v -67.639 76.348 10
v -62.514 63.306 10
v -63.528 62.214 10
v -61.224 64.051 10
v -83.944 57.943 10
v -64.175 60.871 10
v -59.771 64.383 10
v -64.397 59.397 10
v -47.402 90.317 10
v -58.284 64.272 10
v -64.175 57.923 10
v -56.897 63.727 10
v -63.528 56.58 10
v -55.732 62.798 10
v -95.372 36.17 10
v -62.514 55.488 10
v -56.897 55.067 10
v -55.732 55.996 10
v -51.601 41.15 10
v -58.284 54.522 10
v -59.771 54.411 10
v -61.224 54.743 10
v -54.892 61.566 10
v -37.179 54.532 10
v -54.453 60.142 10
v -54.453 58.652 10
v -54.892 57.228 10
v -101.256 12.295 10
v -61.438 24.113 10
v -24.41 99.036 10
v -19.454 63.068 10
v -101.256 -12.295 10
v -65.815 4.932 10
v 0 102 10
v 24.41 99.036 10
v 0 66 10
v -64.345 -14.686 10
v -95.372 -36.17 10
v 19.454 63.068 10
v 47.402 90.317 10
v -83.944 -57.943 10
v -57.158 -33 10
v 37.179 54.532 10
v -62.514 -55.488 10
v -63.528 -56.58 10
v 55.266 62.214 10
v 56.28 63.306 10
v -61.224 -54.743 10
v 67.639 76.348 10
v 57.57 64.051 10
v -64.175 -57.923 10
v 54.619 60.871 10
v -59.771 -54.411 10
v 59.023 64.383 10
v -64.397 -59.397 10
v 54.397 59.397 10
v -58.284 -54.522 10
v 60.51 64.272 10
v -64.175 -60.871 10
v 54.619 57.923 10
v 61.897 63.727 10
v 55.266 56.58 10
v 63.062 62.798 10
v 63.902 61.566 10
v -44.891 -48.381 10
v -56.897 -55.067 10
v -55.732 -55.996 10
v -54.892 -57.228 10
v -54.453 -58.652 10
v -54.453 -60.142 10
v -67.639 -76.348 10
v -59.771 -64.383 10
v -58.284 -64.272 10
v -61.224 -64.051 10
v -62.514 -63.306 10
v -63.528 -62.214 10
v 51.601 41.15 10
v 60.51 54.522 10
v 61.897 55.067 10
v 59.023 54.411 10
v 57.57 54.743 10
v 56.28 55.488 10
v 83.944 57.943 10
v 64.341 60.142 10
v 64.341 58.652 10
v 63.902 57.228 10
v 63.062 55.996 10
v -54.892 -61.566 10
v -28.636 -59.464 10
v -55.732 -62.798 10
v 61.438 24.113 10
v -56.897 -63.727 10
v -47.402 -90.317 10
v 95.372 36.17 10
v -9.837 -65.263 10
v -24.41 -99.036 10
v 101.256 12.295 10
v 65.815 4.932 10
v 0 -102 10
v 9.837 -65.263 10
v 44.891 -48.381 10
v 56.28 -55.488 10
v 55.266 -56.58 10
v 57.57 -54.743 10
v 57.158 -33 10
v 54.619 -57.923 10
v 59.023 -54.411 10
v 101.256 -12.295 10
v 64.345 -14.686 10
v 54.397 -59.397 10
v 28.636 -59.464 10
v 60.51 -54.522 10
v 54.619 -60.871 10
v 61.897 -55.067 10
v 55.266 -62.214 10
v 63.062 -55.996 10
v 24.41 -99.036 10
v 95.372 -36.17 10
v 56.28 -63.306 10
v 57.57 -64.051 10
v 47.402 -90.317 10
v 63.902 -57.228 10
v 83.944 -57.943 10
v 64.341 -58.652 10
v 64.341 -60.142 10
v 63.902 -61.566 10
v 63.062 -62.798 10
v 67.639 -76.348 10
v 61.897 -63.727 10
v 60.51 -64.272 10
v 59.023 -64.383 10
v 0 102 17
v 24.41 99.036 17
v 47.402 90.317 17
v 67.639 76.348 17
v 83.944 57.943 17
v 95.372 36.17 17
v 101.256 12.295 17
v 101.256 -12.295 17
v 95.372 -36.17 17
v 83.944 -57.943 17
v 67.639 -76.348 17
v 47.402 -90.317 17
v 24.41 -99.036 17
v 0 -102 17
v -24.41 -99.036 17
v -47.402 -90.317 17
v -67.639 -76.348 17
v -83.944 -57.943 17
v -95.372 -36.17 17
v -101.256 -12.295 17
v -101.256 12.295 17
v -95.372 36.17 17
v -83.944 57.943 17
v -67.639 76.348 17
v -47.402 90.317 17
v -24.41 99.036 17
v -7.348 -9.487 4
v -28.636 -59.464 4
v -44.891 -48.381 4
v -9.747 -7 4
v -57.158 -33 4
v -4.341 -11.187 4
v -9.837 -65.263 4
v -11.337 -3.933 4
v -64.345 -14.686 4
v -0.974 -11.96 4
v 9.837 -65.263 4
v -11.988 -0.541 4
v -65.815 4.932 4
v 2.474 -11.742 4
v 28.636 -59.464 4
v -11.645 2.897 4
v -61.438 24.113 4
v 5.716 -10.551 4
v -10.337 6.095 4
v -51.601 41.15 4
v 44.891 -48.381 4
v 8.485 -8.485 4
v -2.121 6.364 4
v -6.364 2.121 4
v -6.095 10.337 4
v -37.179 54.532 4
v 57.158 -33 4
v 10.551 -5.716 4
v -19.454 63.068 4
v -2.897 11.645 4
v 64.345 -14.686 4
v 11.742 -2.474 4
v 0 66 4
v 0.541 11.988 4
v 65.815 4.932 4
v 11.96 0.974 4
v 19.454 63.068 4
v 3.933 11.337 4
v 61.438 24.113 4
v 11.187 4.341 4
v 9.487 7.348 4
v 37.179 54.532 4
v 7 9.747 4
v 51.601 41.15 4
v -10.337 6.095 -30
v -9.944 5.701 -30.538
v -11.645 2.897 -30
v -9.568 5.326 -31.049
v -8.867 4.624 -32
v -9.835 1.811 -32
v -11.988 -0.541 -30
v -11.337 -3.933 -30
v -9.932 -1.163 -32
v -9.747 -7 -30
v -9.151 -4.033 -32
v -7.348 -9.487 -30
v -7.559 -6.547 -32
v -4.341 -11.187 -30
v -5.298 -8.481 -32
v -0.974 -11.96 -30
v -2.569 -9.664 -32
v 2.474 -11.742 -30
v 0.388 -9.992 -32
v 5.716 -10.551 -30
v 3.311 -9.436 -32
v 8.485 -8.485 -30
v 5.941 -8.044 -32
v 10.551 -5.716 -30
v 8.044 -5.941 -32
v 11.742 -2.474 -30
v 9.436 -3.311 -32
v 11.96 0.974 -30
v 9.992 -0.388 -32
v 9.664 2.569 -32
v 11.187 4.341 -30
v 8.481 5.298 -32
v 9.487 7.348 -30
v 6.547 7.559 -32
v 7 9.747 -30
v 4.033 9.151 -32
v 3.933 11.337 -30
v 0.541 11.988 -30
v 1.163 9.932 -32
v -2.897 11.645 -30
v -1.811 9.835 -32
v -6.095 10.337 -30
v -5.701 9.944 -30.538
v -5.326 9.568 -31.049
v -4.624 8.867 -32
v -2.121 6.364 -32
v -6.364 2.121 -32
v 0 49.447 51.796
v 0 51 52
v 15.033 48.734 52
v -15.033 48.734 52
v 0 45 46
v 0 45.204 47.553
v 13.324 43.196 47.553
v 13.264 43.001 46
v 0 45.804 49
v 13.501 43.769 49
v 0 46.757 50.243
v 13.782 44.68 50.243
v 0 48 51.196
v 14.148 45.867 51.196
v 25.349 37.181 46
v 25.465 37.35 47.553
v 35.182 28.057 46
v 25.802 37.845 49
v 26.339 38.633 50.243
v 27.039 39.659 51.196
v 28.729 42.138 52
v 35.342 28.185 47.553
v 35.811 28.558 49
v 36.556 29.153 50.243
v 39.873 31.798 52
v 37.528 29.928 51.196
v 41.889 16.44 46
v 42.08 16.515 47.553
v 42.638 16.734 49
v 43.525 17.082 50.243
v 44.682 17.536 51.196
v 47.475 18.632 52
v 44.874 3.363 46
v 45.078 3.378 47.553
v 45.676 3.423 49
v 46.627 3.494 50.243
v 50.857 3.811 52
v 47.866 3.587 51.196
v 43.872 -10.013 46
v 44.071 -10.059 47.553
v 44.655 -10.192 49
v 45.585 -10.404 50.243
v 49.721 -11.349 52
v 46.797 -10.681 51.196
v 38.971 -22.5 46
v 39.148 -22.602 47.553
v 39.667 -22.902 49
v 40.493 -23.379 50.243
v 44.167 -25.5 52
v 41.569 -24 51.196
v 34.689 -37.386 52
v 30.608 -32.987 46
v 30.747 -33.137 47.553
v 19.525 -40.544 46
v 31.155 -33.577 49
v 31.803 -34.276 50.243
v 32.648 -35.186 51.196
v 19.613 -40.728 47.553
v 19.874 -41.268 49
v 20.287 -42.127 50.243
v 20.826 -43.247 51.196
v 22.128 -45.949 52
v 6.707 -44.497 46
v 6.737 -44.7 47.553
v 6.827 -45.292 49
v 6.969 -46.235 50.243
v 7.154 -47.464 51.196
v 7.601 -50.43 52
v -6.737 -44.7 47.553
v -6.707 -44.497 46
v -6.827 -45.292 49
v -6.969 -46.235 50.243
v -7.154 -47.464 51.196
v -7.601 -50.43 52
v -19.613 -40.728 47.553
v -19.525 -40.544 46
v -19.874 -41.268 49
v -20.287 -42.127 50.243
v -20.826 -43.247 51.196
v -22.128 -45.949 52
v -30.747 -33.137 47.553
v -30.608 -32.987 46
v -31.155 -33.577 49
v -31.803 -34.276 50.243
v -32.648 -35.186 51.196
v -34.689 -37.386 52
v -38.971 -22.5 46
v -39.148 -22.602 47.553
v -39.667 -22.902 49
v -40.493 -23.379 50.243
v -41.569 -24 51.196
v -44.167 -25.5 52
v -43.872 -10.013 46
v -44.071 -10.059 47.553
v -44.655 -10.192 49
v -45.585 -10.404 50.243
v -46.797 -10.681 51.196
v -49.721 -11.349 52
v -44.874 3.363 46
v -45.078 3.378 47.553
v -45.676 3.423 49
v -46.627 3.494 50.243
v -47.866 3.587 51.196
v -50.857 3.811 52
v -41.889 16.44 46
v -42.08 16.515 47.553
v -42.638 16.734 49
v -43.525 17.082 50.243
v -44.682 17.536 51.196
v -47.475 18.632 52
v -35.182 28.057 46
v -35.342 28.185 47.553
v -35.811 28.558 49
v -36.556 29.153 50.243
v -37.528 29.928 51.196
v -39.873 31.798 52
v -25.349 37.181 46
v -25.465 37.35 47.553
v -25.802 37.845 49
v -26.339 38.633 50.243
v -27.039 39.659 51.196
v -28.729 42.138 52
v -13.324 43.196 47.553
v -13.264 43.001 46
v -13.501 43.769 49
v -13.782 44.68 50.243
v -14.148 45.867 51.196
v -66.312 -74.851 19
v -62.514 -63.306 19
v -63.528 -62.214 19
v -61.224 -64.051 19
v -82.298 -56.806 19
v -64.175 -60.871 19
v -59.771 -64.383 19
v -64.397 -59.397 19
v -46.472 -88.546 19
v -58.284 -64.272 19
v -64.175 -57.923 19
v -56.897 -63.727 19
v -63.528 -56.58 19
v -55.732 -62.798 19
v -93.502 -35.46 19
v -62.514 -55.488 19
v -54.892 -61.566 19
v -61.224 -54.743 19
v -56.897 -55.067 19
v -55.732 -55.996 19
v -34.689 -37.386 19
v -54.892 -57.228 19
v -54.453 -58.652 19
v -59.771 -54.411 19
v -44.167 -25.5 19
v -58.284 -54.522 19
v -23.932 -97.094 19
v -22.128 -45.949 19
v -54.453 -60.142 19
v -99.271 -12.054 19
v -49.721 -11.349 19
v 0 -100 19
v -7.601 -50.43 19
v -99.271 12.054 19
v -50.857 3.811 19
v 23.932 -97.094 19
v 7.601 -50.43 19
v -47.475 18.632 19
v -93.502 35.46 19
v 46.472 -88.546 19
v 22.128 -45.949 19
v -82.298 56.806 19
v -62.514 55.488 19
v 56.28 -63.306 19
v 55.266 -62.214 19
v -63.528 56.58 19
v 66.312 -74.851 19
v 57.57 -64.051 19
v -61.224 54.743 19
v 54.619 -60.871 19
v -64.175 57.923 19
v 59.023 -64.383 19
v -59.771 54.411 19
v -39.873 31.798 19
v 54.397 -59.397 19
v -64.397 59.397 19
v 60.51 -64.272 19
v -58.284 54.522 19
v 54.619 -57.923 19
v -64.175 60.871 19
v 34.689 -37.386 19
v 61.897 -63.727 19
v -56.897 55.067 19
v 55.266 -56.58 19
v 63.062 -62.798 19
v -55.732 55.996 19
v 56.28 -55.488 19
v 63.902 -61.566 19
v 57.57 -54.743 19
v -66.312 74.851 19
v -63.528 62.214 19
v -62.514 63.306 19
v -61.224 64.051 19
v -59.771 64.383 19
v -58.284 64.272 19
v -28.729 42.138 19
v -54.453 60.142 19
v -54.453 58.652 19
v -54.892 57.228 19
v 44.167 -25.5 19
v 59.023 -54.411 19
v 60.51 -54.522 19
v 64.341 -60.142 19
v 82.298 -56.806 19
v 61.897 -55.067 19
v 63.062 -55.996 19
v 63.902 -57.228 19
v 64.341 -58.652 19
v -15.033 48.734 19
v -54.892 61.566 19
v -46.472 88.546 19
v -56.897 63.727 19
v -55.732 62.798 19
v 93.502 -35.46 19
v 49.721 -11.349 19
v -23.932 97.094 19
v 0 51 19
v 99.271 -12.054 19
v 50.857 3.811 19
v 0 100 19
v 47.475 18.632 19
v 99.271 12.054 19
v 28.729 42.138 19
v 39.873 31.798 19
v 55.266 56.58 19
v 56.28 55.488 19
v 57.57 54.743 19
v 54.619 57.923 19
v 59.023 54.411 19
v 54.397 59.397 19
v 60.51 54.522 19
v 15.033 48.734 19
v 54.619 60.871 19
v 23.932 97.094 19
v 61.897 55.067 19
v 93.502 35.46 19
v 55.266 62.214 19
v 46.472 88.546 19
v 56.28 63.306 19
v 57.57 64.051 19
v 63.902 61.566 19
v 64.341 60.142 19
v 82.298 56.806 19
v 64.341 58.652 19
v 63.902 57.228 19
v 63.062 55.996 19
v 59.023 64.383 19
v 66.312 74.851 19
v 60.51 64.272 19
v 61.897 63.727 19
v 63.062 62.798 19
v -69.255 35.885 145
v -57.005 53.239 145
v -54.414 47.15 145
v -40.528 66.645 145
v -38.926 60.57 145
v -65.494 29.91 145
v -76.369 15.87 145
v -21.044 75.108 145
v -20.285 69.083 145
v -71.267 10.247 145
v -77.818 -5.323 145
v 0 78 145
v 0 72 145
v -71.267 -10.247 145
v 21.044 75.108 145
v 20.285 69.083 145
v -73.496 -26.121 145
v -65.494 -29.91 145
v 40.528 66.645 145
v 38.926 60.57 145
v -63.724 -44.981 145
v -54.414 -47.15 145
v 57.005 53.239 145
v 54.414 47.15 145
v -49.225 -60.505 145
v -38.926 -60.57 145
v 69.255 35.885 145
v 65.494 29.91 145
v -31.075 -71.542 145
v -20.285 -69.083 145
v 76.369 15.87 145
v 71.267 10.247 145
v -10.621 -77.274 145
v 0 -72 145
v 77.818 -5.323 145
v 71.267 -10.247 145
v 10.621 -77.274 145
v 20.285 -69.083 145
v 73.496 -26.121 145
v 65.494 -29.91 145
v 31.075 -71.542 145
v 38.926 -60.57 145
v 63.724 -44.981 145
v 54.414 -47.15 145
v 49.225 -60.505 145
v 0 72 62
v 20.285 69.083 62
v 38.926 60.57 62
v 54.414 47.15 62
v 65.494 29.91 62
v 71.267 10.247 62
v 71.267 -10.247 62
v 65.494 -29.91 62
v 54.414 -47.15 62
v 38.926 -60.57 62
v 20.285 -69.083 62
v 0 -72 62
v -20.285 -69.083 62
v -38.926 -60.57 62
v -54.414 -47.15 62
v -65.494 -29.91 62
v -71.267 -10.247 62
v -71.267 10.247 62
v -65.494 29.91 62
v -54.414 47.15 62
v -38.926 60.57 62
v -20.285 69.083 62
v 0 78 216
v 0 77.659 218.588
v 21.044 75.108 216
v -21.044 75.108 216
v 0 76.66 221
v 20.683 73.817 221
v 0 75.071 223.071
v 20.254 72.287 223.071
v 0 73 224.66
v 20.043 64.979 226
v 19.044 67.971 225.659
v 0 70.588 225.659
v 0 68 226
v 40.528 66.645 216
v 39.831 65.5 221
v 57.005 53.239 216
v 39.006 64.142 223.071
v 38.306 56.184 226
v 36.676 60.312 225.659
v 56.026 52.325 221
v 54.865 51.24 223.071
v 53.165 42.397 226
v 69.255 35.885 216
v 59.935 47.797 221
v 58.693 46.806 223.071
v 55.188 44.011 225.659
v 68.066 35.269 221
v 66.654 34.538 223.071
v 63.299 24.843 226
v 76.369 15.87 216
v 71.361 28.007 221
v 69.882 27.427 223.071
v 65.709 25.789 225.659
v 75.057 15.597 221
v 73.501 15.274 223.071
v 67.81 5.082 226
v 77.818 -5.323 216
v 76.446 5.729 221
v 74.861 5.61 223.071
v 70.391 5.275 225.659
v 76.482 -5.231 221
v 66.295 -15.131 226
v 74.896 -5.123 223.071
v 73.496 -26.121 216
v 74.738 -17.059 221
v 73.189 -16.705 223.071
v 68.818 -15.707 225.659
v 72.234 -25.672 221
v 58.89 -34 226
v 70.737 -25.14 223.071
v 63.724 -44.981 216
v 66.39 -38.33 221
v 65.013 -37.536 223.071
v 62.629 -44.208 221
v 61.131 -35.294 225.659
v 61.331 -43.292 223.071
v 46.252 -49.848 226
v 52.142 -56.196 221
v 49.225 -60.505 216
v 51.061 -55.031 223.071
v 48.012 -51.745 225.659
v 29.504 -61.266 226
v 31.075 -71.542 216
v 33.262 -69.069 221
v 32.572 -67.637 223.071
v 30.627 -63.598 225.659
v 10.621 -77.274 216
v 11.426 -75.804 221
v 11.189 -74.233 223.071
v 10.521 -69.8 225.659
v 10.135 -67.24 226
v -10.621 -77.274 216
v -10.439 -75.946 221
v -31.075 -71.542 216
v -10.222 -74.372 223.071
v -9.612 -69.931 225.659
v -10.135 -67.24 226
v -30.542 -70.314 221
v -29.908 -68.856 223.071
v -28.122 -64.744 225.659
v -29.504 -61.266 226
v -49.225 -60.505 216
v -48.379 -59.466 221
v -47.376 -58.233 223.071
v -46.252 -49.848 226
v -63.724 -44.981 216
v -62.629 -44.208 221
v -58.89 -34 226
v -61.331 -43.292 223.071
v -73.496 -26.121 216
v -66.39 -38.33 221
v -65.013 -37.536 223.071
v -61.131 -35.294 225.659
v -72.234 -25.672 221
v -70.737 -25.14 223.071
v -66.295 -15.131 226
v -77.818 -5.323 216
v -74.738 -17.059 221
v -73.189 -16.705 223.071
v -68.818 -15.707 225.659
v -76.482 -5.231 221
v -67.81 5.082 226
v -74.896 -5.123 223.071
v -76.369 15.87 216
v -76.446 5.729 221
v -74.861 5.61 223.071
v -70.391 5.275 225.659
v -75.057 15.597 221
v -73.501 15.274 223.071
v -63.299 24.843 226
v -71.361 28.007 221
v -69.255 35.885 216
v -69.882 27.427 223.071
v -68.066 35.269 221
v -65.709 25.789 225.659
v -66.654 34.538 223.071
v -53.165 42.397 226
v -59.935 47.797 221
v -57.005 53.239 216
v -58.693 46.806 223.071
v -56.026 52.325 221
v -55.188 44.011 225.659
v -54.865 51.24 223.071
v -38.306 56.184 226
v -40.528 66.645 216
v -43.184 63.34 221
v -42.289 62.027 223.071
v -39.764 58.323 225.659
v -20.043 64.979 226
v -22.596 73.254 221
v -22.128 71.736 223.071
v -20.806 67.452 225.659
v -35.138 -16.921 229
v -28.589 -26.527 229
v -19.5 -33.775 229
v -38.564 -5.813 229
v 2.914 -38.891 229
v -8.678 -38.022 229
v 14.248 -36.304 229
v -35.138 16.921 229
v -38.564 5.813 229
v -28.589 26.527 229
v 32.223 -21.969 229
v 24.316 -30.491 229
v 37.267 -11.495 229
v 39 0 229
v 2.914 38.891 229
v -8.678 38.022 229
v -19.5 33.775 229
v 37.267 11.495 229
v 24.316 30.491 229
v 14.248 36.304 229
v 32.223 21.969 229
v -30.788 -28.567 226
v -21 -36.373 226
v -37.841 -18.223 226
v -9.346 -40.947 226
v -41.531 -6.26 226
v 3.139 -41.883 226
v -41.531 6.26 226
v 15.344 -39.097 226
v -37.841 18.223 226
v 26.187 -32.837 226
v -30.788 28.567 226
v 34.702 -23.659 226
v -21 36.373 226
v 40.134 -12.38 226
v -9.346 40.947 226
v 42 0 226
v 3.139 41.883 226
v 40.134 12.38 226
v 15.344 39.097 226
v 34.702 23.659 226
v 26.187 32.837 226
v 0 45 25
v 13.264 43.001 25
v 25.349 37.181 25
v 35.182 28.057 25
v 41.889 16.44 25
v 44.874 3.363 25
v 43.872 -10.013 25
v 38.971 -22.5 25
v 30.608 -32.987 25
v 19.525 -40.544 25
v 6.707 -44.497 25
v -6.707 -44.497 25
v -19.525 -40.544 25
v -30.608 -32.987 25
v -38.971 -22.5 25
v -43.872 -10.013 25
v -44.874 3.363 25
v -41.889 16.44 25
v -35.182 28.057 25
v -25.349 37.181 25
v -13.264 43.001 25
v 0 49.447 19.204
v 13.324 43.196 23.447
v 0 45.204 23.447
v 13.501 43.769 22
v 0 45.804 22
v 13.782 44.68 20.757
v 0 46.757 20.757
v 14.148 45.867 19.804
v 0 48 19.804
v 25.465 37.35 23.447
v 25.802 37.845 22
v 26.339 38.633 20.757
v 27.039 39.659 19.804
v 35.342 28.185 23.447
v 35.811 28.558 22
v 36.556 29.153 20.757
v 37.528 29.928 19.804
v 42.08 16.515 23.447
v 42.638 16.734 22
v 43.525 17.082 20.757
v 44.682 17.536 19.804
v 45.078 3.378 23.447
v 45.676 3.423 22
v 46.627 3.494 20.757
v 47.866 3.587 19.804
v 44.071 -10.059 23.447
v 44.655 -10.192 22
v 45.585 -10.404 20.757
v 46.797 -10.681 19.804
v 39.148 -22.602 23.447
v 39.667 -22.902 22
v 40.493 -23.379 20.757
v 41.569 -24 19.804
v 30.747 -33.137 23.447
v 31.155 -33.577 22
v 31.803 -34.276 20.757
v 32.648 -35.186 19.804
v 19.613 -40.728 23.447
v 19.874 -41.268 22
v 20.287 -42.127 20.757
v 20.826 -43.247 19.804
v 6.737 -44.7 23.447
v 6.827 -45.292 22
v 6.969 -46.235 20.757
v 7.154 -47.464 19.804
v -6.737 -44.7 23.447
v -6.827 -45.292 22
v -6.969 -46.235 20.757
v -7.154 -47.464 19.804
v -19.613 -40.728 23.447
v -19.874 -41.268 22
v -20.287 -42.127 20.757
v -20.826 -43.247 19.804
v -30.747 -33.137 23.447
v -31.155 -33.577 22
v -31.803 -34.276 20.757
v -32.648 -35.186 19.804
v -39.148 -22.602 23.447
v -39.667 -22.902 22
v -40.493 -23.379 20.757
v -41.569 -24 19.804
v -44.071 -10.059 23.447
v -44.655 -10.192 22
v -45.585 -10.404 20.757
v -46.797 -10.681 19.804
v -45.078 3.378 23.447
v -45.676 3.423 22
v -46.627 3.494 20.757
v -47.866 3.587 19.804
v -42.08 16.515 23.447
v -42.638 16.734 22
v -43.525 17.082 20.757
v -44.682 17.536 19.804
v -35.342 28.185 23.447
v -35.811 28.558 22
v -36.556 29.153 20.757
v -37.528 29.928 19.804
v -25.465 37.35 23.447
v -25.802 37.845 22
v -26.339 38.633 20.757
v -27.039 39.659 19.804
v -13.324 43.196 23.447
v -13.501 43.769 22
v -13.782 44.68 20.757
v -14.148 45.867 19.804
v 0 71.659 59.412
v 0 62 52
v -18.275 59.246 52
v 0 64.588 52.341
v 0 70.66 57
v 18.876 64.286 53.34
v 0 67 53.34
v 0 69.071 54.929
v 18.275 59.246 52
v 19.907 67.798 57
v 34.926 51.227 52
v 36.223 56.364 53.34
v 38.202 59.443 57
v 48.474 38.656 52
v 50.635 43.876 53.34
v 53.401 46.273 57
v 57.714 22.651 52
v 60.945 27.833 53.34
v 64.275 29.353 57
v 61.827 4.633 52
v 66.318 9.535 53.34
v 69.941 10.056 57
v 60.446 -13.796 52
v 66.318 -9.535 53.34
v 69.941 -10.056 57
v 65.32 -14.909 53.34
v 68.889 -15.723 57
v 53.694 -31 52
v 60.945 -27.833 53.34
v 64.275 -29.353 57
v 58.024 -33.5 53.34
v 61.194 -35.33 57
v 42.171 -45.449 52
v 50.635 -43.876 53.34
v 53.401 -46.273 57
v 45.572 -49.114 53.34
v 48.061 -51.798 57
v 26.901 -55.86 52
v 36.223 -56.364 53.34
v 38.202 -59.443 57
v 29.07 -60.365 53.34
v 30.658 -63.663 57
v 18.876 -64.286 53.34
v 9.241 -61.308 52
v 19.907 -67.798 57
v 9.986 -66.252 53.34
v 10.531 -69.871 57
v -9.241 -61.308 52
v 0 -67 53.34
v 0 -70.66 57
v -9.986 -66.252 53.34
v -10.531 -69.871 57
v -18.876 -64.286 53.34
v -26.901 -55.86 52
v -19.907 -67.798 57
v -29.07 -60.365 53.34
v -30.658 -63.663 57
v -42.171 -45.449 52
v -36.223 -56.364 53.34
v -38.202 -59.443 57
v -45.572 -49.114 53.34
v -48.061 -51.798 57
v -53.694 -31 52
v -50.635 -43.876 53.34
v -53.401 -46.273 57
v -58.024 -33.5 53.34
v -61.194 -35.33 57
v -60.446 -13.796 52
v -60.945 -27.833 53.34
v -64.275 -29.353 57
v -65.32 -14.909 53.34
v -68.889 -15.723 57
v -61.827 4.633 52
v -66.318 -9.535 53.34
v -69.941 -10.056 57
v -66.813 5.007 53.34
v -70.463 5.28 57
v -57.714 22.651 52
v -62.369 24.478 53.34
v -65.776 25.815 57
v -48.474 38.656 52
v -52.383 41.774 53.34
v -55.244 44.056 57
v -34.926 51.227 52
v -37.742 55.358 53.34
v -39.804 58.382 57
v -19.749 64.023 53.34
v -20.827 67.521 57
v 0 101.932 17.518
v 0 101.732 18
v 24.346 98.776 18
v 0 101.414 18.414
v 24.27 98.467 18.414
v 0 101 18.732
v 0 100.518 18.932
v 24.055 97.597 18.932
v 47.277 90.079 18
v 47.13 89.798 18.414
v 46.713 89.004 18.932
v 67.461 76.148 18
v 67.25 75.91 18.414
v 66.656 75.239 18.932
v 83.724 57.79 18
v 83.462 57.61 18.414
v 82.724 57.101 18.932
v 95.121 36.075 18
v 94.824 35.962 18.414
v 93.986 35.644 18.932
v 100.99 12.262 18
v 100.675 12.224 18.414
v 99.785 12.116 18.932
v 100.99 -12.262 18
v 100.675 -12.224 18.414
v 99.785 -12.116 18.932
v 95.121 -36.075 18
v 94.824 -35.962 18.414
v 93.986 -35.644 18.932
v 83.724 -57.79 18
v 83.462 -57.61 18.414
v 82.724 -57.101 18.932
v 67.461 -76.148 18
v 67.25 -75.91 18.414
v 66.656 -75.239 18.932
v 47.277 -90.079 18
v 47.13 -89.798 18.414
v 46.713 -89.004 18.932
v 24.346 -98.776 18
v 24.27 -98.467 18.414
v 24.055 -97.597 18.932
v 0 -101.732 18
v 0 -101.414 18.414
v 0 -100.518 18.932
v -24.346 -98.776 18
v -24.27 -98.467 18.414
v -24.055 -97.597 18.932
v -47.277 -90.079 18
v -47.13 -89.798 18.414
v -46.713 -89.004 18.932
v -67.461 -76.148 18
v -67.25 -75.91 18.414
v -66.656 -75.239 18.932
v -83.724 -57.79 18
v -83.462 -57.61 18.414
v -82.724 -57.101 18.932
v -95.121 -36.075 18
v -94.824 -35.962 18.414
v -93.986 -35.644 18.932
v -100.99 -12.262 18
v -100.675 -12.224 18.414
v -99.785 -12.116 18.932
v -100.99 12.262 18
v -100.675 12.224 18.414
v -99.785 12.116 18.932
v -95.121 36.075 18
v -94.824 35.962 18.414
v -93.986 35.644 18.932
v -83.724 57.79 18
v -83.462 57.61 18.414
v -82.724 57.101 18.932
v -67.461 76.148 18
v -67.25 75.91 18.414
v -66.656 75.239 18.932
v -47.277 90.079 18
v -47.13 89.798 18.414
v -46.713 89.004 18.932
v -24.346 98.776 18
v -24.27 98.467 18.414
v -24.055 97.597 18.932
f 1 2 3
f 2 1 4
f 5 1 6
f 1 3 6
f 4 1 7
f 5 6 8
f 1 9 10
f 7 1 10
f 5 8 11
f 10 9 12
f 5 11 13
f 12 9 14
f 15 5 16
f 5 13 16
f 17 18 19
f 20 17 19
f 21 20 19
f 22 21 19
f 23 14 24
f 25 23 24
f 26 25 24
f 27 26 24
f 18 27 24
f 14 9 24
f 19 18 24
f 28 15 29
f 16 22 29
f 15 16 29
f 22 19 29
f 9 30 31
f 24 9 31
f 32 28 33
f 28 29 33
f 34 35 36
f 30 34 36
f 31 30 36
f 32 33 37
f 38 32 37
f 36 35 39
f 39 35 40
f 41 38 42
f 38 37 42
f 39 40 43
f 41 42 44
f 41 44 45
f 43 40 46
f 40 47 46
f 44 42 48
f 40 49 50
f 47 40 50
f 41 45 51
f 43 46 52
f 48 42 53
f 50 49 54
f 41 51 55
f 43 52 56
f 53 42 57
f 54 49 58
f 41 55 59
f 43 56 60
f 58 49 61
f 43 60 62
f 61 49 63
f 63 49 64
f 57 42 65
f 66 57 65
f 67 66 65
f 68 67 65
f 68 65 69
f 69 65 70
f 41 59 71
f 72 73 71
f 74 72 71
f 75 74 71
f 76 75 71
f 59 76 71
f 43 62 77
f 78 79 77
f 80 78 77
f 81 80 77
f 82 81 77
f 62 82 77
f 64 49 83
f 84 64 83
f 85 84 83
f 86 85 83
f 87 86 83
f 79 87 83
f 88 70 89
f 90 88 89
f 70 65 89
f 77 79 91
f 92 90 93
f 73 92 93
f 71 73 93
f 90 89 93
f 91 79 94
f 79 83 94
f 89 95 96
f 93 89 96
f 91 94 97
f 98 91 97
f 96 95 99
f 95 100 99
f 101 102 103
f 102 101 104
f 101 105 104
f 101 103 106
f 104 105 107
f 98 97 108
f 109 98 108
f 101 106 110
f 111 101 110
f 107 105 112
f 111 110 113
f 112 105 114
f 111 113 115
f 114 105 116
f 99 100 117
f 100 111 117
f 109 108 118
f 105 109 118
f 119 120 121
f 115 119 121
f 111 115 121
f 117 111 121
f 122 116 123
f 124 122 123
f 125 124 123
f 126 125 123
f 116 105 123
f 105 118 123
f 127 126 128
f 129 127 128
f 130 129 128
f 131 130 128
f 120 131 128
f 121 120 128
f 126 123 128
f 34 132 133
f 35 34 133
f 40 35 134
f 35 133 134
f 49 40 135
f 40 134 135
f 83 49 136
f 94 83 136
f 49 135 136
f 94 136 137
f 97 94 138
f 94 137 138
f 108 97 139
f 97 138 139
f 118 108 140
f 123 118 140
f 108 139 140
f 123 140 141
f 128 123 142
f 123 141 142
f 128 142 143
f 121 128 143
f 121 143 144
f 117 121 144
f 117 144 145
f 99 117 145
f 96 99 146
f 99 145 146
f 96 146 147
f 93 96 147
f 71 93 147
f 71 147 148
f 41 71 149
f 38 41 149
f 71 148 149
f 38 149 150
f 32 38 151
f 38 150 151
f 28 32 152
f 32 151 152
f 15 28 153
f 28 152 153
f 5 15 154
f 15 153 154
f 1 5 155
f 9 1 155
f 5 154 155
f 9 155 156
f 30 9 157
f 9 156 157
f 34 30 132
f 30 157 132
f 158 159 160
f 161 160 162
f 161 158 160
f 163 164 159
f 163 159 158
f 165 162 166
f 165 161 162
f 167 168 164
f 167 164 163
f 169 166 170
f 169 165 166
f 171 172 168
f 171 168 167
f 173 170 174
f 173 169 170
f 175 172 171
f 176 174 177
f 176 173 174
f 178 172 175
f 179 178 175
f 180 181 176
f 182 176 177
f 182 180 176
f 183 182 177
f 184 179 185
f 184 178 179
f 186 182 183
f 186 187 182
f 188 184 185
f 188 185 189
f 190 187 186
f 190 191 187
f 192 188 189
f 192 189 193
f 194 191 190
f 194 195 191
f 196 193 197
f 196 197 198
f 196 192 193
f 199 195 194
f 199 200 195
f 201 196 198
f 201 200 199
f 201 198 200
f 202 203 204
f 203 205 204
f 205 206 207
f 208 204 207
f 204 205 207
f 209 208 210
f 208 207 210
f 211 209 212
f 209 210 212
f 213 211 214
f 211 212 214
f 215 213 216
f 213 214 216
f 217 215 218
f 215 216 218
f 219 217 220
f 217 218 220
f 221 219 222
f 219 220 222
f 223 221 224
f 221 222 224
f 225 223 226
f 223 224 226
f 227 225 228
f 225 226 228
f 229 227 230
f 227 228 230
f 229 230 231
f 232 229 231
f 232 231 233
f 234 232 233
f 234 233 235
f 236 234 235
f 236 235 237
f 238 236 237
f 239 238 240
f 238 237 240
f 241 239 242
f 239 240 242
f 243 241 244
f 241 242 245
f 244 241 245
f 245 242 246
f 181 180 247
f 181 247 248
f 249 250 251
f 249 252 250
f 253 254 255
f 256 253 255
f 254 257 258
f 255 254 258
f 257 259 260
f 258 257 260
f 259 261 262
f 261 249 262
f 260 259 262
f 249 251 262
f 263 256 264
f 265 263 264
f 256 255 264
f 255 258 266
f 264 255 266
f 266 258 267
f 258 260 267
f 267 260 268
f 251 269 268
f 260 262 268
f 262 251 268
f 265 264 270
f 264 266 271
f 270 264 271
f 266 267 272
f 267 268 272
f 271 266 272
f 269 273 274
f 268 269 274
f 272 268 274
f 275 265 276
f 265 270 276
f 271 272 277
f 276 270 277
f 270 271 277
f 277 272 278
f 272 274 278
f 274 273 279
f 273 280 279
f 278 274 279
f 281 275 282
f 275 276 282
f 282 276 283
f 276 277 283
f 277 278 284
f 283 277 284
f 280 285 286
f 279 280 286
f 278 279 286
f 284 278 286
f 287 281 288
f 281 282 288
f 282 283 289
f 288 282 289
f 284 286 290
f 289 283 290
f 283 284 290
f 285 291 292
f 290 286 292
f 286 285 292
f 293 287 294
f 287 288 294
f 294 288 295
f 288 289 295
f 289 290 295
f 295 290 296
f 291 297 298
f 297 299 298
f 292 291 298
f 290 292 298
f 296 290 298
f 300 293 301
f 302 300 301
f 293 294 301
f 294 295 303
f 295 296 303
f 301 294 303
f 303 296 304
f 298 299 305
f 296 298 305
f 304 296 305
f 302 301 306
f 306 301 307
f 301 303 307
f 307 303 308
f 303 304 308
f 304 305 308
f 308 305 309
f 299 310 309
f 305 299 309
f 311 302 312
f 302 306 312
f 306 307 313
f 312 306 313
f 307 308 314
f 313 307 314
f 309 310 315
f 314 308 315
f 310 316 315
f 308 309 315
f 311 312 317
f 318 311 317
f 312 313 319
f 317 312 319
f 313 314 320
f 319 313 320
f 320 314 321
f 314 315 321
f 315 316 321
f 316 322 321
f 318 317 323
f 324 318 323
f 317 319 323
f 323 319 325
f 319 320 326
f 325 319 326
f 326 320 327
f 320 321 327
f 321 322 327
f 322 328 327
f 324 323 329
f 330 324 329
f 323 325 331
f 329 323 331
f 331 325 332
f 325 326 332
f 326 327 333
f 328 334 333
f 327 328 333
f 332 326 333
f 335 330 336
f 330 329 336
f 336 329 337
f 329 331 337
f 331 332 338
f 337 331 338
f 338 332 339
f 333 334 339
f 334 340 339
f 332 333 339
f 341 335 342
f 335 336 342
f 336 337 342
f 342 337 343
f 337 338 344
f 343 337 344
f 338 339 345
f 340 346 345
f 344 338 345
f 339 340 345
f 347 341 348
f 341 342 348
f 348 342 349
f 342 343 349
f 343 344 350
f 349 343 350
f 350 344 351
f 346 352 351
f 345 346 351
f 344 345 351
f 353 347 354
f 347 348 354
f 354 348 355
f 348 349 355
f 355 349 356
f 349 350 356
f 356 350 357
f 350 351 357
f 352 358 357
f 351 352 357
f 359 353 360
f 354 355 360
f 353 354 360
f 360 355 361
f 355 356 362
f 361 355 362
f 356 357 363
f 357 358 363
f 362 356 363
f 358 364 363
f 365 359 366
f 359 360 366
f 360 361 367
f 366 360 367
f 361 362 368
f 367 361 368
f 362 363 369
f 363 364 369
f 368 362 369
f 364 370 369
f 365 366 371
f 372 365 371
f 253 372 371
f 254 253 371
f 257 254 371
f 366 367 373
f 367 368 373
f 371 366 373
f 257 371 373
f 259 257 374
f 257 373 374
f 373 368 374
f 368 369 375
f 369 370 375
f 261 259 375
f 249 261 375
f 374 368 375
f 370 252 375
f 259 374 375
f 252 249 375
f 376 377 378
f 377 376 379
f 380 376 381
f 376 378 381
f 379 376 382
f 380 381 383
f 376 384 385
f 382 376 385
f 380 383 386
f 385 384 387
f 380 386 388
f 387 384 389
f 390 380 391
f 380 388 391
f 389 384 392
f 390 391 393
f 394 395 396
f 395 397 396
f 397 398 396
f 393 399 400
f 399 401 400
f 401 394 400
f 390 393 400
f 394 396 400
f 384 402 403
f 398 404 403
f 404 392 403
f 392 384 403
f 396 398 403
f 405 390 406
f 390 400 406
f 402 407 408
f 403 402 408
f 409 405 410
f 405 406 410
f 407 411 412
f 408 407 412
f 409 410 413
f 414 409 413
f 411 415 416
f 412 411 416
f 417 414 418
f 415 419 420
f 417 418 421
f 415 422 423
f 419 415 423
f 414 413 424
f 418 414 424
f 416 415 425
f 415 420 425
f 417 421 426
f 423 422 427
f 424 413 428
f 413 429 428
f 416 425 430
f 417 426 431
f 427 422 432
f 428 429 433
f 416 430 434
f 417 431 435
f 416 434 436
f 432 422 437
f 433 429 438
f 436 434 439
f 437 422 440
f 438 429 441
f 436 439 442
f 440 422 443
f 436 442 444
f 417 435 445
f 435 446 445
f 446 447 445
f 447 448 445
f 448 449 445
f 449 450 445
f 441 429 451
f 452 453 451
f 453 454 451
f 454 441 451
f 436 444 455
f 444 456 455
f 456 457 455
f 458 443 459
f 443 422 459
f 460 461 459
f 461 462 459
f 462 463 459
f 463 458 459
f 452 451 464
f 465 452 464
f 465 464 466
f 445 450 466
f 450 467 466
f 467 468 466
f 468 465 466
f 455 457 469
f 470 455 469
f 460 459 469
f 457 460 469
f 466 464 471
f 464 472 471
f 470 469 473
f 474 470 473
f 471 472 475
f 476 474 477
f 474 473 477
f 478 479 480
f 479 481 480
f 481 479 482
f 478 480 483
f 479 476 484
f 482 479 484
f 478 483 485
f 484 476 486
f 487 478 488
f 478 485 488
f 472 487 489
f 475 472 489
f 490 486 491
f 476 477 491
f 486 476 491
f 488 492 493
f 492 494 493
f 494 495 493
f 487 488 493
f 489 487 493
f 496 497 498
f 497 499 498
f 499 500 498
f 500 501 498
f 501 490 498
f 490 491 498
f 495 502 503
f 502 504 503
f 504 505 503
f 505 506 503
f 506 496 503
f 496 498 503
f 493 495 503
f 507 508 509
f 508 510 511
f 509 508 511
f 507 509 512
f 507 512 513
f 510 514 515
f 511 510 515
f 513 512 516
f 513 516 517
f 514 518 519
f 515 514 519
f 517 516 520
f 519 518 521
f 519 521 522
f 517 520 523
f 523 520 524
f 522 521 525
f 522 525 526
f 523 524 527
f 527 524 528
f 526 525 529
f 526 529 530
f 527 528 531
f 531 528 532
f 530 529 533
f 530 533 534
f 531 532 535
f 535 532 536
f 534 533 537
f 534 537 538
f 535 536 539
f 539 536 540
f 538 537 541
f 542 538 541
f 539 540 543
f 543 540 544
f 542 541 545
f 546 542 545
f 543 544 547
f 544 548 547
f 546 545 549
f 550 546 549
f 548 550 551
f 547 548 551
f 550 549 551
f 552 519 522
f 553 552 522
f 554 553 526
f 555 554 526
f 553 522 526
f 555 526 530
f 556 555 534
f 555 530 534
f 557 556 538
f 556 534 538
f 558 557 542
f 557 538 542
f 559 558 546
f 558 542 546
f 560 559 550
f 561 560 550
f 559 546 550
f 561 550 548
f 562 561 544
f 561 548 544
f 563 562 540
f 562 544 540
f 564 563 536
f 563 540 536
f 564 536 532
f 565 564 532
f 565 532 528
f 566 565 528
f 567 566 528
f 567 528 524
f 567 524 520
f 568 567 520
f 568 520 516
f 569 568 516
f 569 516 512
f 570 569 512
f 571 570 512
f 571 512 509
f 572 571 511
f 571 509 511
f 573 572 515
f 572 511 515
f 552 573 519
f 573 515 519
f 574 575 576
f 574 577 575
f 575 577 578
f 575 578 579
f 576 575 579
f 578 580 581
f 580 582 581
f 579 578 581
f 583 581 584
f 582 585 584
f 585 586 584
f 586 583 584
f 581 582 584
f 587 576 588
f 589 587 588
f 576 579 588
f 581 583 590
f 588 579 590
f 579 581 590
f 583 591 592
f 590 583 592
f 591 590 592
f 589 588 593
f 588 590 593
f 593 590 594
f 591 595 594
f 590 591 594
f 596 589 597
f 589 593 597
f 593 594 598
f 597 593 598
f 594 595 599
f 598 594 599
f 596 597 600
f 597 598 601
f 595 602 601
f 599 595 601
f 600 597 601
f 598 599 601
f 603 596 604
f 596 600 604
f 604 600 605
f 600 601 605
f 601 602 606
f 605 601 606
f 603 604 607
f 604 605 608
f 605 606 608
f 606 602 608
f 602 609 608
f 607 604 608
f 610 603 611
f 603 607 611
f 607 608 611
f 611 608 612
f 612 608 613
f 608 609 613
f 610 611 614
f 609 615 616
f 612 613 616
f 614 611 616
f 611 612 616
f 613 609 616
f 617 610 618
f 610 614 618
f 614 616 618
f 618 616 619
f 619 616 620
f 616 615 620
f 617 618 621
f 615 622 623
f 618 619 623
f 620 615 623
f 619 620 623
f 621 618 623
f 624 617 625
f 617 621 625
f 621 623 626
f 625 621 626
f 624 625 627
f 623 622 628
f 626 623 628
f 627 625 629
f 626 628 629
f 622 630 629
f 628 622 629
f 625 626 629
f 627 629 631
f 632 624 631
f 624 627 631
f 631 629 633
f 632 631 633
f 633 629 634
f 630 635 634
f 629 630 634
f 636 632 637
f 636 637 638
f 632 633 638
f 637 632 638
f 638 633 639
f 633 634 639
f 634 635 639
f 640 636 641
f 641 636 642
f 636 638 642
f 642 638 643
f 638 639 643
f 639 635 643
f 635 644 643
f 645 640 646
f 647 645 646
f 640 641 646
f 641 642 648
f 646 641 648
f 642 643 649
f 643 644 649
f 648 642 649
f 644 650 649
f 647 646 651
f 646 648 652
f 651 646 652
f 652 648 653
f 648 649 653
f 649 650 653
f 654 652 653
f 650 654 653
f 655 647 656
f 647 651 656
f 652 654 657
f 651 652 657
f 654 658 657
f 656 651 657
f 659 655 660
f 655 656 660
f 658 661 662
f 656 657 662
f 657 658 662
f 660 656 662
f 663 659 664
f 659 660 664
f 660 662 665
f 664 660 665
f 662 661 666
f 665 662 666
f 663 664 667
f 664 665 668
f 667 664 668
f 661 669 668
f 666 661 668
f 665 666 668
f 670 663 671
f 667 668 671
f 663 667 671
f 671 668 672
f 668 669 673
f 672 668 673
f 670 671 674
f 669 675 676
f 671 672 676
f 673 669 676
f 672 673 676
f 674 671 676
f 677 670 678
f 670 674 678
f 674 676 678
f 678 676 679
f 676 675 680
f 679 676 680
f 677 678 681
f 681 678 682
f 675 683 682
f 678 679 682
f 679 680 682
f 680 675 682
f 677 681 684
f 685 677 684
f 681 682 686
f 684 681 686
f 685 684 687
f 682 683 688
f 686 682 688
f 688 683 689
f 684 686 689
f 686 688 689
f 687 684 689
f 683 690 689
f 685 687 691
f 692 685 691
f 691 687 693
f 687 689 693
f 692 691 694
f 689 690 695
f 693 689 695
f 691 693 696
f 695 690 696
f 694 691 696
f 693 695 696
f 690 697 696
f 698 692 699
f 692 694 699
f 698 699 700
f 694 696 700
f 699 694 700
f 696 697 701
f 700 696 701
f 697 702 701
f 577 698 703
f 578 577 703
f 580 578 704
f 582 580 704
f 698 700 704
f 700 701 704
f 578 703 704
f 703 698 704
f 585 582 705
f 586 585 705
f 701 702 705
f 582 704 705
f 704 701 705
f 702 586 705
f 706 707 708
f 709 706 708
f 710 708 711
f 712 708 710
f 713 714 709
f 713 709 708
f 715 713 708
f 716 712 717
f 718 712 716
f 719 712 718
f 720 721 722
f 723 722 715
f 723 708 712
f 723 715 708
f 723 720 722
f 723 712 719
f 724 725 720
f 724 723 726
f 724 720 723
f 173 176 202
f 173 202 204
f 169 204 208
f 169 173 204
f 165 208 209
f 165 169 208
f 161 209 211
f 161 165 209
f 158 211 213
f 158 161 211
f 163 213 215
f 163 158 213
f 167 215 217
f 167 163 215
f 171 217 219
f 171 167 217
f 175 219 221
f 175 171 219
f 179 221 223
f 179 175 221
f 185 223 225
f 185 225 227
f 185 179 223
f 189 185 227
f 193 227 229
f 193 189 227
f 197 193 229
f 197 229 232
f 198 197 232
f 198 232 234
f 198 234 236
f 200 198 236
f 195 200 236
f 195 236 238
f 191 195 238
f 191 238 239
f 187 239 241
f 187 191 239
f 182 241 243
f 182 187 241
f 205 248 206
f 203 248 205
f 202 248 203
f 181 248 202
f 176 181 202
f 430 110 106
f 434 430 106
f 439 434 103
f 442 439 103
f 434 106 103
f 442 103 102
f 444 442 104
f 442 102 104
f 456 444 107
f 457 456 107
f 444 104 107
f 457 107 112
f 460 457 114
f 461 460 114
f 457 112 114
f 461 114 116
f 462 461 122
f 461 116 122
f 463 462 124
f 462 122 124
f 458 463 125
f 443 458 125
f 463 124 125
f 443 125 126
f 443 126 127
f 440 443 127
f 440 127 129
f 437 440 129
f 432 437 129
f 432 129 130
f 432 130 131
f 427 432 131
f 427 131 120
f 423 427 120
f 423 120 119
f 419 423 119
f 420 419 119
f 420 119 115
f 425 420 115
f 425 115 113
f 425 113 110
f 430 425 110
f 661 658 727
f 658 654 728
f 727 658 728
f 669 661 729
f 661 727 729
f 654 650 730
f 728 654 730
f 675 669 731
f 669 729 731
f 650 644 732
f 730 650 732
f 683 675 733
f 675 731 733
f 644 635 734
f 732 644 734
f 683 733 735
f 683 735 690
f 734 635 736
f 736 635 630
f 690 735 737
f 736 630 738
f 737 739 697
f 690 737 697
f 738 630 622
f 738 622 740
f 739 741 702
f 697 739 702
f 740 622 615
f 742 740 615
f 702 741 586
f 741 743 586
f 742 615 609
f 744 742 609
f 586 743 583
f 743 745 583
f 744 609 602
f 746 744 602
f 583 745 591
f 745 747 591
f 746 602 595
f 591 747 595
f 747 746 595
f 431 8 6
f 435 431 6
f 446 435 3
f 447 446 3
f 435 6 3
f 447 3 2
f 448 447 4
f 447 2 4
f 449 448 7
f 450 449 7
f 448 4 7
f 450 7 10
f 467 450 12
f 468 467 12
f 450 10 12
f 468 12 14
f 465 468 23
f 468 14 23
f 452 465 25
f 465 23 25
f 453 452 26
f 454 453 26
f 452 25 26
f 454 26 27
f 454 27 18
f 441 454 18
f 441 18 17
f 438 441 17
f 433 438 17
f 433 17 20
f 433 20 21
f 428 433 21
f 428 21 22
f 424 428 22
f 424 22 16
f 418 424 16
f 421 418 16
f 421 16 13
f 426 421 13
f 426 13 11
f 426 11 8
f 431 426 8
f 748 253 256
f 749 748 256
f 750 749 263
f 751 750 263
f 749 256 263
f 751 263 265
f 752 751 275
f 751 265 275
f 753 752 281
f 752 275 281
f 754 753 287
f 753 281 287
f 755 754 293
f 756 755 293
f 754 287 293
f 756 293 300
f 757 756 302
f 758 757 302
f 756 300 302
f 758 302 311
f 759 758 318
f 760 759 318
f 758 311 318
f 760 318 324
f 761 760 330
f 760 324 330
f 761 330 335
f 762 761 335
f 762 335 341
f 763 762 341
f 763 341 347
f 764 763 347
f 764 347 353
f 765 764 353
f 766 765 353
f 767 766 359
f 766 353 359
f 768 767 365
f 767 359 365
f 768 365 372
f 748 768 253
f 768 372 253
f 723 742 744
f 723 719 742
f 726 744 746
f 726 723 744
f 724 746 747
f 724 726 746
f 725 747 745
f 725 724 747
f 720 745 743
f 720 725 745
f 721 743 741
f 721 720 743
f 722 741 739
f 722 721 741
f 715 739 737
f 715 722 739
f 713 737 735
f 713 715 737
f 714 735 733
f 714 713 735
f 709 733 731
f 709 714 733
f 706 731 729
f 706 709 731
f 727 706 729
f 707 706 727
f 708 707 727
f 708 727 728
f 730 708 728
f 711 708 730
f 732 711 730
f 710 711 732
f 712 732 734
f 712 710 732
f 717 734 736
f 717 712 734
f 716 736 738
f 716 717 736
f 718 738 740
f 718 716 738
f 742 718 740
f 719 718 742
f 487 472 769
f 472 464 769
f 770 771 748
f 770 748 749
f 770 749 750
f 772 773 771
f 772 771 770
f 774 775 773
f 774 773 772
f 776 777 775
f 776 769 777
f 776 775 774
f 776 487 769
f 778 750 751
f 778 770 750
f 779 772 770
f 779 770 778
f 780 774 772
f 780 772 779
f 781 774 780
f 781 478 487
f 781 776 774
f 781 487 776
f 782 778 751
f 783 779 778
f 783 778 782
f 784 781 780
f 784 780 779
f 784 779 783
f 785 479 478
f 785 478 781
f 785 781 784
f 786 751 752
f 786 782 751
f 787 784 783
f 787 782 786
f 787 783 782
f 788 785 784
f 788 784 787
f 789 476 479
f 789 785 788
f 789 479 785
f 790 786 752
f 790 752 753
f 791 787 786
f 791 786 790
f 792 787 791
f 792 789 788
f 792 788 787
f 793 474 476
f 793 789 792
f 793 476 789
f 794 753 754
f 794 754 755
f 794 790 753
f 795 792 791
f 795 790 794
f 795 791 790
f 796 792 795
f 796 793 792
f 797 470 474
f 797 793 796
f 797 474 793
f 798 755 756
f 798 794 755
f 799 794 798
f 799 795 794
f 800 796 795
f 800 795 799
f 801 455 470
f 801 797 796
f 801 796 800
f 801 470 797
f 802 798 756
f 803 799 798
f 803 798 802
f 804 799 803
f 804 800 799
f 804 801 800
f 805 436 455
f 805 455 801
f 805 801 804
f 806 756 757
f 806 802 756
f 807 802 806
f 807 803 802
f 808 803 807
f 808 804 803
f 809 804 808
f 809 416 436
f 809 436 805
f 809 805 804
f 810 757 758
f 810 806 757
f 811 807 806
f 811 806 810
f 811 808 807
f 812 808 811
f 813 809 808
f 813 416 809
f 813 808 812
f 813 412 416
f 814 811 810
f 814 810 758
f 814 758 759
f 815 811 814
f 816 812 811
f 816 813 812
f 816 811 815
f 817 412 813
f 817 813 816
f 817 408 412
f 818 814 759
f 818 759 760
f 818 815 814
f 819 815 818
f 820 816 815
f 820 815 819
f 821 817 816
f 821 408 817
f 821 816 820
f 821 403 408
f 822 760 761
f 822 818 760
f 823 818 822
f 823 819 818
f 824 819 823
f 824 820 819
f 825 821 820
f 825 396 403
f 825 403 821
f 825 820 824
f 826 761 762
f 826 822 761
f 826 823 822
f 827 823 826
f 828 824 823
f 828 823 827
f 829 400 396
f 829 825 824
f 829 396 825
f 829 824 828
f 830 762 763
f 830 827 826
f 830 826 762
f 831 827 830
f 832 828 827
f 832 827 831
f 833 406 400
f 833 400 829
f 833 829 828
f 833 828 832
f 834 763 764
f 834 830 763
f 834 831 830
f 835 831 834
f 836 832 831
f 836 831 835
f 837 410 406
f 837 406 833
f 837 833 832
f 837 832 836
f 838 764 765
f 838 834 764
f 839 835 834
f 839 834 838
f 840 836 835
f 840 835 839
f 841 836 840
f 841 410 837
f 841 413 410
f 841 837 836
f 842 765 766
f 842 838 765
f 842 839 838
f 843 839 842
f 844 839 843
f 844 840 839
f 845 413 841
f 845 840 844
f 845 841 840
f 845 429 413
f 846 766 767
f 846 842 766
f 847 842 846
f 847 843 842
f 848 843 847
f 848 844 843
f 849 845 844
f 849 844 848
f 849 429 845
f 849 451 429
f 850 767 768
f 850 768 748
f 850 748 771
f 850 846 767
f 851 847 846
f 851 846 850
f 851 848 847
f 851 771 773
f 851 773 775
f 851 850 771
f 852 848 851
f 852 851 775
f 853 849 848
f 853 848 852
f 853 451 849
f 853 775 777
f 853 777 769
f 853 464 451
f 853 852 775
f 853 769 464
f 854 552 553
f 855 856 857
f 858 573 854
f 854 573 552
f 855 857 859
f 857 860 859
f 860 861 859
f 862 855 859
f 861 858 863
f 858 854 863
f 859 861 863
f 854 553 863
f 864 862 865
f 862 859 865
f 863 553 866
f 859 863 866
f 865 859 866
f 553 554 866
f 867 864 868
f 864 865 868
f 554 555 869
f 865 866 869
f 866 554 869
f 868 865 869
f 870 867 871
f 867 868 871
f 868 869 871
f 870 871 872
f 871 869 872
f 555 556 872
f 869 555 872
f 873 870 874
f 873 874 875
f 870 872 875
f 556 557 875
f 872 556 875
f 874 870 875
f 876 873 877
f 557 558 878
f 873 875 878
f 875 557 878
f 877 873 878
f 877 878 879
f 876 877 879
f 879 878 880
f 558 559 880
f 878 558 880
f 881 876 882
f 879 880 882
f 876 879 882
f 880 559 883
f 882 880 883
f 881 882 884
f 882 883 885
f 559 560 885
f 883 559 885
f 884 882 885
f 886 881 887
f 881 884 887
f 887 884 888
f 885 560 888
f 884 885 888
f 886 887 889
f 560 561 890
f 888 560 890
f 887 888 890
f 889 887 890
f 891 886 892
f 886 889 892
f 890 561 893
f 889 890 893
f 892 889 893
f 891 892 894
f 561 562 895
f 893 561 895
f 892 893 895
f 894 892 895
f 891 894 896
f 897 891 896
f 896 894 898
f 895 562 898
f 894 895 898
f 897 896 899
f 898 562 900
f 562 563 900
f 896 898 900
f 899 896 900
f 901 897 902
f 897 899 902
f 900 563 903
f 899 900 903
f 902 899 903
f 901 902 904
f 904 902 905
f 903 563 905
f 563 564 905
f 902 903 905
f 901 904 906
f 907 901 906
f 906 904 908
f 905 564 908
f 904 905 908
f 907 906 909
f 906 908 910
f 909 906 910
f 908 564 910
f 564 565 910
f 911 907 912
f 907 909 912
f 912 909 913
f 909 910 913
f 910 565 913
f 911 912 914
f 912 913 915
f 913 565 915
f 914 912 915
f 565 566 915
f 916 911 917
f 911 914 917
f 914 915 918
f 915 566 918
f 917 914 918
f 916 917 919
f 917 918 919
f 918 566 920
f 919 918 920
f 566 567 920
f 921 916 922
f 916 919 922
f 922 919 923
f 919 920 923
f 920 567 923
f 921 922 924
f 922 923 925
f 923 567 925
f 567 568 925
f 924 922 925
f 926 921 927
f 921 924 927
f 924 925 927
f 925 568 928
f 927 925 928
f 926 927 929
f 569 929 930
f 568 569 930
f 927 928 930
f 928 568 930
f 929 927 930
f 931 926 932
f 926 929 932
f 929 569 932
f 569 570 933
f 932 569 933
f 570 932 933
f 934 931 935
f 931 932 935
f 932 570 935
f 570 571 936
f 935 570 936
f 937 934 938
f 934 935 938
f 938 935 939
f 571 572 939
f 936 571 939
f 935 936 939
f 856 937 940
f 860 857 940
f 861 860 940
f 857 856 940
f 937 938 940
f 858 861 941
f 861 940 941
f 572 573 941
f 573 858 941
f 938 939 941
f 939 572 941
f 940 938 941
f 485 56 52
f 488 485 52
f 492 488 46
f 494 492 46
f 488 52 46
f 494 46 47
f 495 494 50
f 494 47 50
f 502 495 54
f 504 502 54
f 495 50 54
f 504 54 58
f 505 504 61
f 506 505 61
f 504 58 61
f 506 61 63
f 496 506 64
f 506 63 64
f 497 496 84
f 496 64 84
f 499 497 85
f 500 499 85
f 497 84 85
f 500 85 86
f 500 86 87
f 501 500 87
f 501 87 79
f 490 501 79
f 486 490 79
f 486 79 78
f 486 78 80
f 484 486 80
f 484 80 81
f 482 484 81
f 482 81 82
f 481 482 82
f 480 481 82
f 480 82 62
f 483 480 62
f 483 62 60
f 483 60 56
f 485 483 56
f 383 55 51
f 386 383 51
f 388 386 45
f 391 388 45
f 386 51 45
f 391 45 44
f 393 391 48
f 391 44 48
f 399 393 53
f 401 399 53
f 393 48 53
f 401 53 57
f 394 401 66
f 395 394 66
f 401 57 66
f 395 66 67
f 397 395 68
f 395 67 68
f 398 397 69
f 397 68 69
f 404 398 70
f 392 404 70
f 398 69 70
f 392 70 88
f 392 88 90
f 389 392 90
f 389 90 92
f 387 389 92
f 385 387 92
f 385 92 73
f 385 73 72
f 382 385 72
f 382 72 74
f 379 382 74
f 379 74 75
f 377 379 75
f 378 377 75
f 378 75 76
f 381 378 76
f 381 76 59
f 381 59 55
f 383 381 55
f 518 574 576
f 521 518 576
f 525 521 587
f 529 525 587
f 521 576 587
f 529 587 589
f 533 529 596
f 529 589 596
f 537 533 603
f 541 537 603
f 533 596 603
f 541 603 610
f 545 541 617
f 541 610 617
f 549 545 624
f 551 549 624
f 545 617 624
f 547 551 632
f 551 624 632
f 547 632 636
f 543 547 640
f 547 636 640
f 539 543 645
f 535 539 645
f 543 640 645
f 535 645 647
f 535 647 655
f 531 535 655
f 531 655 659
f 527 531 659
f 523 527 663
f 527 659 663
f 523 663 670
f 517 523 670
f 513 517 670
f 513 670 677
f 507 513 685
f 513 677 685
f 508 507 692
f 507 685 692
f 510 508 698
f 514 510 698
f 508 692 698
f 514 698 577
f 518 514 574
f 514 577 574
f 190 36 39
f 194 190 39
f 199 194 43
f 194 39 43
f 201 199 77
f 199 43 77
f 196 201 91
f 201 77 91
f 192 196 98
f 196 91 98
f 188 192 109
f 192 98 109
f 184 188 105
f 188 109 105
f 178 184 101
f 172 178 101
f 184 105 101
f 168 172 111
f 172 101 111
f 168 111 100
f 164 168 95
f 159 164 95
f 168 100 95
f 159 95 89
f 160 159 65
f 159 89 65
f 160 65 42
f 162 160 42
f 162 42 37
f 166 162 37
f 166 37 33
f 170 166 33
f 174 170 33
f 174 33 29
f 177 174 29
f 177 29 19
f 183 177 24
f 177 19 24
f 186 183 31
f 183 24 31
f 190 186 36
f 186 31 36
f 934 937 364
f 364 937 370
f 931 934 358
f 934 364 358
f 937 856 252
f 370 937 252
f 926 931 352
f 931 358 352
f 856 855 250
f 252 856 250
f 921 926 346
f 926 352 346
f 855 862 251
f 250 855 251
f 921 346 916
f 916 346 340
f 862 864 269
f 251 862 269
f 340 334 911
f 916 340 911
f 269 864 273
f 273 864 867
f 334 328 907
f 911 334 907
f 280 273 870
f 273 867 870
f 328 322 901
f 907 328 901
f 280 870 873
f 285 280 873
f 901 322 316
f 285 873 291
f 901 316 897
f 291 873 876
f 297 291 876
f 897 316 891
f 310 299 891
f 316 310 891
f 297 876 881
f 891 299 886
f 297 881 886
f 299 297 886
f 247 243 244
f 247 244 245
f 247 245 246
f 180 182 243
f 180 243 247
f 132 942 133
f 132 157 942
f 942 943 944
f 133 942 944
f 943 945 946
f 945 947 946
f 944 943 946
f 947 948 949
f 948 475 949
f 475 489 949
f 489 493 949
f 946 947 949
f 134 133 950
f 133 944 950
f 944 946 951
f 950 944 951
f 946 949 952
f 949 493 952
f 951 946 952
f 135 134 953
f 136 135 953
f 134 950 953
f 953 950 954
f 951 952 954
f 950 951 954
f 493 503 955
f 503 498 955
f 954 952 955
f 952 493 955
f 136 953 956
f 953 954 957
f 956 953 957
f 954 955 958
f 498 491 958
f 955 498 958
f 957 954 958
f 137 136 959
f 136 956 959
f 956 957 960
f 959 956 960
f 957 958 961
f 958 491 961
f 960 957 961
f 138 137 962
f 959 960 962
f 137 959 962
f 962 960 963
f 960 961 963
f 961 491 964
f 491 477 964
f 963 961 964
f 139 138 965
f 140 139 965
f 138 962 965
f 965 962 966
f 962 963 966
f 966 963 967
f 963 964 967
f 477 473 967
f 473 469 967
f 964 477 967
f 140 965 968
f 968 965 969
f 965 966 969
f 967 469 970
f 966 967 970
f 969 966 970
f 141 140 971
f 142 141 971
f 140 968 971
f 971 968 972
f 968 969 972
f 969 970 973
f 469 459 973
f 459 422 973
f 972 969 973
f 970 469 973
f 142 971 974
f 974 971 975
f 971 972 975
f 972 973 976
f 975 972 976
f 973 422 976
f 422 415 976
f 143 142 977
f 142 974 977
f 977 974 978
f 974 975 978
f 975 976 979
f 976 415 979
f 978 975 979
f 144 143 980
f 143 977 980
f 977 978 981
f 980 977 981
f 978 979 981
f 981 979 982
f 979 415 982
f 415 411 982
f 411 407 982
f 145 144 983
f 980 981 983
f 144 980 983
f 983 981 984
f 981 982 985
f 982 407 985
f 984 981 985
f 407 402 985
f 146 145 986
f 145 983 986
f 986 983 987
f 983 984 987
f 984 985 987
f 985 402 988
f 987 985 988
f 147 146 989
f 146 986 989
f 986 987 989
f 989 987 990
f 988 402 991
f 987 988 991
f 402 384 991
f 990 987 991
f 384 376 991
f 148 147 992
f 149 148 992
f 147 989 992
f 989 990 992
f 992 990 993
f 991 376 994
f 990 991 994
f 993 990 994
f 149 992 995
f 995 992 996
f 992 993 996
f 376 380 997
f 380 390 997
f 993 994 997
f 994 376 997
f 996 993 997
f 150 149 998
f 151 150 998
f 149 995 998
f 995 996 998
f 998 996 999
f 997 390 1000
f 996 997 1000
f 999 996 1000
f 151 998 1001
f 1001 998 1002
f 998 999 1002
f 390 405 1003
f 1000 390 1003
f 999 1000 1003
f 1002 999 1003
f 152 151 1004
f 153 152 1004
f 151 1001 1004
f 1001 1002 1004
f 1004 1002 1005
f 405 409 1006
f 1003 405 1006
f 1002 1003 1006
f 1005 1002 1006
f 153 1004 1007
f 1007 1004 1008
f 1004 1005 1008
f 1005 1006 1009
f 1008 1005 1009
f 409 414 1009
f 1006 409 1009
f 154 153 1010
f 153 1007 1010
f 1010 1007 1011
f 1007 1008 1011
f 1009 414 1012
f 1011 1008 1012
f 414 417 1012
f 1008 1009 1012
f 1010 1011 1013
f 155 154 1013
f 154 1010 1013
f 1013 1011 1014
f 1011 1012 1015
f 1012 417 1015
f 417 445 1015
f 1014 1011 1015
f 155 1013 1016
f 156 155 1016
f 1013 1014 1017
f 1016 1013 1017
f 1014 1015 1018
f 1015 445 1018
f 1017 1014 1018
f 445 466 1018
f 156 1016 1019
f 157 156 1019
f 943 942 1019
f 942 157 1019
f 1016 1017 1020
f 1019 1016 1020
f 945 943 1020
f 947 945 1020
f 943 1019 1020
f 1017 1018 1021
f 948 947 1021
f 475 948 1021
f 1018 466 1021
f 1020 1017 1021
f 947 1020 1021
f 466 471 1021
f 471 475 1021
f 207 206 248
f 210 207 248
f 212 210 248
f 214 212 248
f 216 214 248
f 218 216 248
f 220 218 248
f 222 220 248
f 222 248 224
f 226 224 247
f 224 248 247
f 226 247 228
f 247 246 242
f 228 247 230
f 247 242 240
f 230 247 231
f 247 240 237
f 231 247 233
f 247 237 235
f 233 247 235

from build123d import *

# Parameters (mm, degrees)
ESQUISSE2_R                      = 66
EXTRUSION1_DEPTH                 = 6
EXTRUSION2_DEPTH                 = 36
ESQUISSE4_R                      = 42
EXTRUSION3_DEPTH                 = 3
EXTRUSION3_TAPER                 = 45
DIAM_TRE_DU_PER_AGE_M10_0_10_1_D = 10
DIAM_TRE_DU_PER_AGE_M10_0_10_2_D = 10
DIAM_TRE_DU_PER_AGE_M10_0_10_3_D = 10
DIAM_TRE_DU_PER_AGE_M10_0_10_4_D = 10
CHANFREIN1_SIZE                  = 2
CONG_1_R                         = 2
CONG_2_R                         = 6
CONG_3_R                         = 6
CONG_4_R                         = 10
CONG_5_R                         = 10


with BuildPart() as part:
    # Esquisse1 → Révolution1 (revolve)
    with BuildSketch(Plane.XZ, mode=Mode.PRIVATE) as r_volution1_sk:
        Polygon((78, 226), (0, 226), (0, 10), (102, 10), (102, 19), (45, 19), (45, 52), (72, 52), (72, 145), (78, 145), align=None)
    revolve(r_volution1_sk.sketch.rotate(Axis((0, 0, 226), (0, 0, -1)), 270), axis=Axis((0, 0, 226), (0, 0, -1)))

    # Esquisse2 → Extrusion1 (add)
    with BuildSketch(Plane(origin=(0, 0, 10), x_dir=(-1, 0, 0), z_dir=(0, 0, -1))):
        with Locations(Location((0, 0, 0), (0, 0, 90))):
            Circle(ESQUISSE2_R)
    extrude(amount=EXTRUSION1_DEPTH)

    # Esquisse3 → Extrusion2 (add)
    with BuildSketch(Plane(origin=(0, 0, 4), x_dir=(-1, 0, 0), z_dir=(0, 0, -1))):
        with BuildLine():
            Line((6.363961031, 2.121320344), (10.337158706, 6.094518019))
            ThreePointArc((10.337158706, 6.094518019), (-8.485281374, -8.485281374), (6.094518019, 10.337158706))
            Line((6.094518019, 10.337158706), (2.121320344, 6.363961031))
            Line((2.121320344, 6.363961031), (6.363961031, 2.121320344))
        make_face()
    extrude(amount=EXTRUSION2_DEPTH)

    # Esquisse4 → Extrusion3 (add)
    with BuildSketch(Plane.XY.offset(226)):
        Circle(ESQUISSE4_R)
    extrude(amount=EXTRUSION3_DEPTH, taper=EXTRUSION3_TAPER)

    # Diamètre du perçage M10.0 (10)1 (through all)
    with Locations(Plane.XY.offset(19)):
        with Locations((59.39696962, -59.39696962)):
            Hole(DIAM_TRE_DU_PER_AGE_M10_0_10_1_D / 2)

    # Diamètre du perçage M10.0 (10)2 (through all)
    with Locations(Plane.XY.offset(19)):
        with Locations((59.39696962, 59.39696962)):
            Hole(DIAM_TRE_DU_PER_AGE_M10_0_10_2_D / 2)

    # Diamètre du perçage M10.0 (10)3 (through all)
    with Locations(Plane.XY.offset(19)):
        with Locations((-59.39696962, -59.39696962)):
            Hole(DIAM_TRE_DU_PER_AGE_M10_0_10_3_D / 2)

    # Diamètre du perçage M10.0 (10)4 (through all)
    with Locations(Plane.XY.offset(19)):
        with Locations((-59.39696962, 59.39696962)):
            Hole(DIAM_TRE_DU_PER_AGE_M10_0_10_4_D / 2)

    # Chanfrein1
    chanfrein1_edges = [part.edges().sort_by_distance(p)[0] for p in [
        (8.485281374, -8.485281374, -32),
    ]]
    chamfer(chanfrein1_edges, length=CHANFREIN1_SIZE)

    # Congé1
    cong_1_edges = [part.edges().sort_by_distance(p)[0] for p in [
        (0, -102, 19),
    ]]
    fillet(cong_1_edges, radius=CONG_1_R)

    # Congé2
    cong_2_edges = [part.edges().sort_by_distance(p)[0] for p in [
        (0, -45, 52),
    ]]
    fillet(cong_2_edges, radius=CONG_2_R)

    # Congé3
    cong_3_edges = [part.edges().sort_by_distance(p)[0] for p in [
        (0, -45, 19),
    ]]
    fillet(cong_3_edges, radius=CONG_3_R)

    # Congé4
    cong_4_edges = [part.edges().sort_by_distance(p)[0] for p in [
        (0, -72, 52),
    ]]
    fillet(cong_4_edges, radius=CONG_4_R)

    # Congé5
    cong_5_edges = [part.edges().sort_by_distance(p)[0] for p in [
        (0, -78, 226),
    ]]
    fillet(cong_5_edges, radius=CONG_5_R)


solid = part.part
